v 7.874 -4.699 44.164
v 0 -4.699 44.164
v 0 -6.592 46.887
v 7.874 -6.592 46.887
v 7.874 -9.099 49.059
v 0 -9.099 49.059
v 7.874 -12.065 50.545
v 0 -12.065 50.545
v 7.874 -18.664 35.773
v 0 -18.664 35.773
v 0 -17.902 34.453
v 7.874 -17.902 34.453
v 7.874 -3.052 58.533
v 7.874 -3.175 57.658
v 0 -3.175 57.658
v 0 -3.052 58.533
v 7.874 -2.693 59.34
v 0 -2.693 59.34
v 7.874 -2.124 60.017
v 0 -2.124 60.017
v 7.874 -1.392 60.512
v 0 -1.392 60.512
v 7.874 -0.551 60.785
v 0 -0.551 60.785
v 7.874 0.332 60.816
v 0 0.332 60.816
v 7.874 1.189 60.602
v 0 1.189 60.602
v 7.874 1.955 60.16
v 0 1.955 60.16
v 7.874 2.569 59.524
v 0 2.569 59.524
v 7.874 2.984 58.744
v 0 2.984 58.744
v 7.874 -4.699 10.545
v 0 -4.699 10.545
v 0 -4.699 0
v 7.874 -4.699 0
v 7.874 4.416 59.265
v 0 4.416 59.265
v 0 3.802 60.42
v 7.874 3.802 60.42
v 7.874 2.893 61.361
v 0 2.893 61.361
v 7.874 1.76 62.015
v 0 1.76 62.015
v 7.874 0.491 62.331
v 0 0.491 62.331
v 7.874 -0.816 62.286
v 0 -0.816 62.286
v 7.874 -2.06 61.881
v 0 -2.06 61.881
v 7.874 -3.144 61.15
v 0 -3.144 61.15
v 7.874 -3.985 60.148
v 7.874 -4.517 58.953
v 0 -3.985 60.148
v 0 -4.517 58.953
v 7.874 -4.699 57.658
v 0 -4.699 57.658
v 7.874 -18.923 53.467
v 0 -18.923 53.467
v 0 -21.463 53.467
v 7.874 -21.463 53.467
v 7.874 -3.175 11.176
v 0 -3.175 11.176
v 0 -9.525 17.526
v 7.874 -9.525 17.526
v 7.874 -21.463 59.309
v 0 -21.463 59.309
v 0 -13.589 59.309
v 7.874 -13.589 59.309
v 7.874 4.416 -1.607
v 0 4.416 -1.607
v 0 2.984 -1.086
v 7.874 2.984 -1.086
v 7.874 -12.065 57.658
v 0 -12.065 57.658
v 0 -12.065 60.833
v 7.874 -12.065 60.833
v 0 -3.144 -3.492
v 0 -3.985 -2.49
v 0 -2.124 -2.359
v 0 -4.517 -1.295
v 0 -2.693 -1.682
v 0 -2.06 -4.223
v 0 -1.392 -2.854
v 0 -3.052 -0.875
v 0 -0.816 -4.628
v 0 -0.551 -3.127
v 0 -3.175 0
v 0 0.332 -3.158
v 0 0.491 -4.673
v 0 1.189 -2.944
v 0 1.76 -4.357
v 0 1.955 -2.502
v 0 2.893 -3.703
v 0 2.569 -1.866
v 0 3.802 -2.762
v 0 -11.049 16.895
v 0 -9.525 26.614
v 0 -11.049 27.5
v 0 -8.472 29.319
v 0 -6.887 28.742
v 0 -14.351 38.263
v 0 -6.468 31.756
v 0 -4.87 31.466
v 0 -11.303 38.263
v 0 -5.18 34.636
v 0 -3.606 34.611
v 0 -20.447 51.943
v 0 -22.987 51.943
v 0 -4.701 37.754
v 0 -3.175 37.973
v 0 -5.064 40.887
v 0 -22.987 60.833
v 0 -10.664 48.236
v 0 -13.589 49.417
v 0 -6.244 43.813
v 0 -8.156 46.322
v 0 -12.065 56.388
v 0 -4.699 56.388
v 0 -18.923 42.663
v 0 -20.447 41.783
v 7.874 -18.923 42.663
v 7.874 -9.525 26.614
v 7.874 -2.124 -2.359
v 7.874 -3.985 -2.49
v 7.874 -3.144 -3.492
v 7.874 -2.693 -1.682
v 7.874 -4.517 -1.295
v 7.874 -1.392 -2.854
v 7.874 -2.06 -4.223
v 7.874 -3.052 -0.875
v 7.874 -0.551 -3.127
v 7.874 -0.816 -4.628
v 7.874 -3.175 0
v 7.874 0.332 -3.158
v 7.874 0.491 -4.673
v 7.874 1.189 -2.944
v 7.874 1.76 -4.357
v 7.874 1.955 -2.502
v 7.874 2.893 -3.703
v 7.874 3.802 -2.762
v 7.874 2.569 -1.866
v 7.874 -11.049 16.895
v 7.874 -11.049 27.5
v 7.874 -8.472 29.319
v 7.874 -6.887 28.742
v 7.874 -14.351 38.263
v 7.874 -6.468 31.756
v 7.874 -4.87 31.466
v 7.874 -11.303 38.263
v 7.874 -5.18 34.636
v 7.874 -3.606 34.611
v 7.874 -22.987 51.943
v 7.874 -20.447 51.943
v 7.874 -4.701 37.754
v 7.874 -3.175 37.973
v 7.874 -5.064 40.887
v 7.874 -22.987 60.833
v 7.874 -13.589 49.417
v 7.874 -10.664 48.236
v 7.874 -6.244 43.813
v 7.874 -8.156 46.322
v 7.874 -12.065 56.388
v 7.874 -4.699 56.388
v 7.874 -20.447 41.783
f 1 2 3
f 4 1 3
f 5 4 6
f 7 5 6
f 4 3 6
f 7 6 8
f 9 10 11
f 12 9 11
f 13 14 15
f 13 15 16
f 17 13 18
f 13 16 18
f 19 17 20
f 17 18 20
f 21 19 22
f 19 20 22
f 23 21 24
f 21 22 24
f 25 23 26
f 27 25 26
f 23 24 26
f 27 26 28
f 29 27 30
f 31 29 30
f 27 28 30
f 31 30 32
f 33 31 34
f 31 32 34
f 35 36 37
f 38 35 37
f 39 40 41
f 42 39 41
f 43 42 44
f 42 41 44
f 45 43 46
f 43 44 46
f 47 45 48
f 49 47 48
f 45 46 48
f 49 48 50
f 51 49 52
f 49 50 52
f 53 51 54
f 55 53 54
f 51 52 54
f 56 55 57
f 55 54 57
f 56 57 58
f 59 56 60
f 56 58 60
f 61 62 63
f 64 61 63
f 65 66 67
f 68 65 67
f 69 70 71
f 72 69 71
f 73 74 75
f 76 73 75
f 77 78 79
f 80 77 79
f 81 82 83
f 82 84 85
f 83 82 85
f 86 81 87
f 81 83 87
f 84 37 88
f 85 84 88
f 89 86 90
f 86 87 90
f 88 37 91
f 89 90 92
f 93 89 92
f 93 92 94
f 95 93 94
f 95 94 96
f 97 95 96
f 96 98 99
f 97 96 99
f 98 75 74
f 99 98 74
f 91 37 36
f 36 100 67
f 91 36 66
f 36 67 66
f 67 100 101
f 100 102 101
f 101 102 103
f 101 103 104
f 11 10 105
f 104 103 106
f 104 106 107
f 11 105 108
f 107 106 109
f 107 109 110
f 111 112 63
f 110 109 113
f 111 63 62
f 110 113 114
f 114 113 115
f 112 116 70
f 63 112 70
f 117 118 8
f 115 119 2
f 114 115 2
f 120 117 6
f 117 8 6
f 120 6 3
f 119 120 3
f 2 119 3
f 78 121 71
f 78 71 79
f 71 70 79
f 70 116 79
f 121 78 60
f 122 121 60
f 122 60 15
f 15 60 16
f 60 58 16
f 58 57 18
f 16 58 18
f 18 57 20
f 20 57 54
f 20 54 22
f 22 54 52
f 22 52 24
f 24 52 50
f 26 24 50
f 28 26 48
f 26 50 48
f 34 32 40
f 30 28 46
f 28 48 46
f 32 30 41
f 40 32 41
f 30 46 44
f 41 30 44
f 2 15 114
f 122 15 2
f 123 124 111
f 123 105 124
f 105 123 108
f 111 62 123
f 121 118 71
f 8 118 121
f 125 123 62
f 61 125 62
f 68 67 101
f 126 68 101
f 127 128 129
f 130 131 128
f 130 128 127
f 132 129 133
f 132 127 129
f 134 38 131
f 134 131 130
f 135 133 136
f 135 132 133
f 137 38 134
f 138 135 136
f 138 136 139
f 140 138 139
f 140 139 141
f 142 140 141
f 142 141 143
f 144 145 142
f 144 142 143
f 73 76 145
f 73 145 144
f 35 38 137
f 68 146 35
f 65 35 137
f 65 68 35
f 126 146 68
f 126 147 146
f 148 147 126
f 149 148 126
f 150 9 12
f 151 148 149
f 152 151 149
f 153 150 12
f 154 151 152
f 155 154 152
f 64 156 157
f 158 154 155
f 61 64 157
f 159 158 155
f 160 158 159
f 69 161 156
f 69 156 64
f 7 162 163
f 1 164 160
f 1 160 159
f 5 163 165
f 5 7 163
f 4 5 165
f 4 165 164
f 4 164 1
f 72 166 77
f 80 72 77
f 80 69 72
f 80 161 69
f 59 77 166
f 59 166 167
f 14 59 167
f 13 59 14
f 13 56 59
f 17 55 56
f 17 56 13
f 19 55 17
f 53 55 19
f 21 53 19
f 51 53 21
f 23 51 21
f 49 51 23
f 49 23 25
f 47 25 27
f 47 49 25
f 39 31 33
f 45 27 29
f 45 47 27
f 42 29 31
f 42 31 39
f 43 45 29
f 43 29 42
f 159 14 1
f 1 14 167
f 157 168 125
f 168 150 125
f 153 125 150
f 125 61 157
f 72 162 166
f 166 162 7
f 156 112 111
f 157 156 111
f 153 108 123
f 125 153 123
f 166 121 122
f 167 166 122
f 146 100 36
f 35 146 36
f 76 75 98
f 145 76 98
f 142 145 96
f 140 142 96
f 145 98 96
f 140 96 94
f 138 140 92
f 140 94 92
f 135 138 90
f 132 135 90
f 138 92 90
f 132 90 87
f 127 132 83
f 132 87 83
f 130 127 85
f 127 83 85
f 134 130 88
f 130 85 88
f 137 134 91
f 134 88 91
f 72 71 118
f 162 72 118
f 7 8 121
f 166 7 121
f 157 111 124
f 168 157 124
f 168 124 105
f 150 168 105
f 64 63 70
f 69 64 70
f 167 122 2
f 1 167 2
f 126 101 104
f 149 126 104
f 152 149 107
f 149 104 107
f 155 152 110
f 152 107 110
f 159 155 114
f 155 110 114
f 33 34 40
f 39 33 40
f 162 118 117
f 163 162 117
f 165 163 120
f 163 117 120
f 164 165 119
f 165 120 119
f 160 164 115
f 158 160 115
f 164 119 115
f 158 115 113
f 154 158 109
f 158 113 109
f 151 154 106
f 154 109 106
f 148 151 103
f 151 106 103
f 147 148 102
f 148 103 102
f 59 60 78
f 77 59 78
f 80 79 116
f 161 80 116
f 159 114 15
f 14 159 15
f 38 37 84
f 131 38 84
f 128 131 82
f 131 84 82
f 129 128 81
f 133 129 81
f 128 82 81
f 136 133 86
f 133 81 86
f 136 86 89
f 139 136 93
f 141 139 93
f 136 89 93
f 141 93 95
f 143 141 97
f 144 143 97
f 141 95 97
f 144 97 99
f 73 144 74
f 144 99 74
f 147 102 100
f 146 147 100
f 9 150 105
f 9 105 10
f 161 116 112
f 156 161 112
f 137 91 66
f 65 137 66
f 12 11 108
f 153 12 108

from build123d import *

# Parameters (mm, degrees)
F1_DEPTH = 7.874


with BuildPart() as f1:
    # F0 (on Right) → F1 (new body)
    with BuildSketch(Plane.YZ):
        with BuildLine():
            ThreePointArc((2.983524, -1.085914), (-0.551333, -3.126765), (-3.175, 0))
            Line((-3.175, 0), (-3.175, 11.176))
            Line((-3.175, 11.176), (-9.525, 17.526))
            Line((-9.525, 17.526), (-9.525, 26.613775))
            ThreePointArc((-9.525, 26.613775), (-4.870258, 31.466186), (-3.175, 37.973))
            Line((-3.175, 37.973), (-3.175, 57.658))
            ThreePointArc((-3.175, 57.658), (-0.551333, 60.784765), (2.983524, 58.743914))
            Line((2.983524, 58.743914), (4.415616, 59.265153))
            ThreePointArc((4.415616, 59.265153), (-0.815973, 62.285612), (-4.699, 57.658))
            Line((-4.699, 57.658), (-12.065, 57.658))
            Line((-12.065, 57.658), (-12.065, 60.833))
            Line((-12.065, 60.833), (-22.987, 60.833))
            Line((-22.987, 60.833), (-22.987, 51.943))
            Line((-22.987, 51.943), (-20.447, 51.943))
            Line((-20.447, 51.943), (-20.447, 41.783))
            Line((-20.447, 41.783), (-14.351, 38.263473))
            Line((-14.351, 38.263473), (-18.664114, 35.773295))
            Line((-18.664114, 35.773295), (-17.902114, 34.453473))
            Line((-17.902114, 34.453473), (-11.303, 38.263473))
            Line((-11.303, 38.263473), (-18.923, 42.662882))
            Line((-18.923, 42.662882), (-18.923, 53.467))
            Line((-18.923, 53.467), (-21.463, 53.467))
            Line((-21.463, 53.467), (-21.463, 59.309))
            Line((-21.463, 59.309), (-13.589, 59.309))
            Line((-13.589, 59.309), (-13.589, 49.417102))
            ThreePointArc((-13.589, 49.417102), (-4.777528, 39.33271), (-11.049, 27.500312))
            Line((-11.049, 27.500312), (-11.049, 16.894739))
            Line((-11.049, 16.894739), (-4.699, 10.544739))
            Line((-4.699, 10.544739), (-4.699, 0))
            ThreePointArc((-4.699, 0), (-0.815973, -4.627612), (4.415616, -1.607153))
            Line((4.415616, -1.607153), (2.983524, -1.085914))
        make_face()
        with BuildLine():
            Line((-12.065, 56.388), (-4.699, 56.388))
            Line((-4.699, 56.388), (-4.699, 44.163517))
            ThreePointArc((-4.699, 44.163517), (-7.778084, 48.051485), (-12.065, 50.545359))
            Line((-12.065, 50.545359), (-12.065, 56.388))
        make_face(mode=Mode.SUBTRACT)
    extrude(amount=F1_DEPTH)


solid = f1.part
